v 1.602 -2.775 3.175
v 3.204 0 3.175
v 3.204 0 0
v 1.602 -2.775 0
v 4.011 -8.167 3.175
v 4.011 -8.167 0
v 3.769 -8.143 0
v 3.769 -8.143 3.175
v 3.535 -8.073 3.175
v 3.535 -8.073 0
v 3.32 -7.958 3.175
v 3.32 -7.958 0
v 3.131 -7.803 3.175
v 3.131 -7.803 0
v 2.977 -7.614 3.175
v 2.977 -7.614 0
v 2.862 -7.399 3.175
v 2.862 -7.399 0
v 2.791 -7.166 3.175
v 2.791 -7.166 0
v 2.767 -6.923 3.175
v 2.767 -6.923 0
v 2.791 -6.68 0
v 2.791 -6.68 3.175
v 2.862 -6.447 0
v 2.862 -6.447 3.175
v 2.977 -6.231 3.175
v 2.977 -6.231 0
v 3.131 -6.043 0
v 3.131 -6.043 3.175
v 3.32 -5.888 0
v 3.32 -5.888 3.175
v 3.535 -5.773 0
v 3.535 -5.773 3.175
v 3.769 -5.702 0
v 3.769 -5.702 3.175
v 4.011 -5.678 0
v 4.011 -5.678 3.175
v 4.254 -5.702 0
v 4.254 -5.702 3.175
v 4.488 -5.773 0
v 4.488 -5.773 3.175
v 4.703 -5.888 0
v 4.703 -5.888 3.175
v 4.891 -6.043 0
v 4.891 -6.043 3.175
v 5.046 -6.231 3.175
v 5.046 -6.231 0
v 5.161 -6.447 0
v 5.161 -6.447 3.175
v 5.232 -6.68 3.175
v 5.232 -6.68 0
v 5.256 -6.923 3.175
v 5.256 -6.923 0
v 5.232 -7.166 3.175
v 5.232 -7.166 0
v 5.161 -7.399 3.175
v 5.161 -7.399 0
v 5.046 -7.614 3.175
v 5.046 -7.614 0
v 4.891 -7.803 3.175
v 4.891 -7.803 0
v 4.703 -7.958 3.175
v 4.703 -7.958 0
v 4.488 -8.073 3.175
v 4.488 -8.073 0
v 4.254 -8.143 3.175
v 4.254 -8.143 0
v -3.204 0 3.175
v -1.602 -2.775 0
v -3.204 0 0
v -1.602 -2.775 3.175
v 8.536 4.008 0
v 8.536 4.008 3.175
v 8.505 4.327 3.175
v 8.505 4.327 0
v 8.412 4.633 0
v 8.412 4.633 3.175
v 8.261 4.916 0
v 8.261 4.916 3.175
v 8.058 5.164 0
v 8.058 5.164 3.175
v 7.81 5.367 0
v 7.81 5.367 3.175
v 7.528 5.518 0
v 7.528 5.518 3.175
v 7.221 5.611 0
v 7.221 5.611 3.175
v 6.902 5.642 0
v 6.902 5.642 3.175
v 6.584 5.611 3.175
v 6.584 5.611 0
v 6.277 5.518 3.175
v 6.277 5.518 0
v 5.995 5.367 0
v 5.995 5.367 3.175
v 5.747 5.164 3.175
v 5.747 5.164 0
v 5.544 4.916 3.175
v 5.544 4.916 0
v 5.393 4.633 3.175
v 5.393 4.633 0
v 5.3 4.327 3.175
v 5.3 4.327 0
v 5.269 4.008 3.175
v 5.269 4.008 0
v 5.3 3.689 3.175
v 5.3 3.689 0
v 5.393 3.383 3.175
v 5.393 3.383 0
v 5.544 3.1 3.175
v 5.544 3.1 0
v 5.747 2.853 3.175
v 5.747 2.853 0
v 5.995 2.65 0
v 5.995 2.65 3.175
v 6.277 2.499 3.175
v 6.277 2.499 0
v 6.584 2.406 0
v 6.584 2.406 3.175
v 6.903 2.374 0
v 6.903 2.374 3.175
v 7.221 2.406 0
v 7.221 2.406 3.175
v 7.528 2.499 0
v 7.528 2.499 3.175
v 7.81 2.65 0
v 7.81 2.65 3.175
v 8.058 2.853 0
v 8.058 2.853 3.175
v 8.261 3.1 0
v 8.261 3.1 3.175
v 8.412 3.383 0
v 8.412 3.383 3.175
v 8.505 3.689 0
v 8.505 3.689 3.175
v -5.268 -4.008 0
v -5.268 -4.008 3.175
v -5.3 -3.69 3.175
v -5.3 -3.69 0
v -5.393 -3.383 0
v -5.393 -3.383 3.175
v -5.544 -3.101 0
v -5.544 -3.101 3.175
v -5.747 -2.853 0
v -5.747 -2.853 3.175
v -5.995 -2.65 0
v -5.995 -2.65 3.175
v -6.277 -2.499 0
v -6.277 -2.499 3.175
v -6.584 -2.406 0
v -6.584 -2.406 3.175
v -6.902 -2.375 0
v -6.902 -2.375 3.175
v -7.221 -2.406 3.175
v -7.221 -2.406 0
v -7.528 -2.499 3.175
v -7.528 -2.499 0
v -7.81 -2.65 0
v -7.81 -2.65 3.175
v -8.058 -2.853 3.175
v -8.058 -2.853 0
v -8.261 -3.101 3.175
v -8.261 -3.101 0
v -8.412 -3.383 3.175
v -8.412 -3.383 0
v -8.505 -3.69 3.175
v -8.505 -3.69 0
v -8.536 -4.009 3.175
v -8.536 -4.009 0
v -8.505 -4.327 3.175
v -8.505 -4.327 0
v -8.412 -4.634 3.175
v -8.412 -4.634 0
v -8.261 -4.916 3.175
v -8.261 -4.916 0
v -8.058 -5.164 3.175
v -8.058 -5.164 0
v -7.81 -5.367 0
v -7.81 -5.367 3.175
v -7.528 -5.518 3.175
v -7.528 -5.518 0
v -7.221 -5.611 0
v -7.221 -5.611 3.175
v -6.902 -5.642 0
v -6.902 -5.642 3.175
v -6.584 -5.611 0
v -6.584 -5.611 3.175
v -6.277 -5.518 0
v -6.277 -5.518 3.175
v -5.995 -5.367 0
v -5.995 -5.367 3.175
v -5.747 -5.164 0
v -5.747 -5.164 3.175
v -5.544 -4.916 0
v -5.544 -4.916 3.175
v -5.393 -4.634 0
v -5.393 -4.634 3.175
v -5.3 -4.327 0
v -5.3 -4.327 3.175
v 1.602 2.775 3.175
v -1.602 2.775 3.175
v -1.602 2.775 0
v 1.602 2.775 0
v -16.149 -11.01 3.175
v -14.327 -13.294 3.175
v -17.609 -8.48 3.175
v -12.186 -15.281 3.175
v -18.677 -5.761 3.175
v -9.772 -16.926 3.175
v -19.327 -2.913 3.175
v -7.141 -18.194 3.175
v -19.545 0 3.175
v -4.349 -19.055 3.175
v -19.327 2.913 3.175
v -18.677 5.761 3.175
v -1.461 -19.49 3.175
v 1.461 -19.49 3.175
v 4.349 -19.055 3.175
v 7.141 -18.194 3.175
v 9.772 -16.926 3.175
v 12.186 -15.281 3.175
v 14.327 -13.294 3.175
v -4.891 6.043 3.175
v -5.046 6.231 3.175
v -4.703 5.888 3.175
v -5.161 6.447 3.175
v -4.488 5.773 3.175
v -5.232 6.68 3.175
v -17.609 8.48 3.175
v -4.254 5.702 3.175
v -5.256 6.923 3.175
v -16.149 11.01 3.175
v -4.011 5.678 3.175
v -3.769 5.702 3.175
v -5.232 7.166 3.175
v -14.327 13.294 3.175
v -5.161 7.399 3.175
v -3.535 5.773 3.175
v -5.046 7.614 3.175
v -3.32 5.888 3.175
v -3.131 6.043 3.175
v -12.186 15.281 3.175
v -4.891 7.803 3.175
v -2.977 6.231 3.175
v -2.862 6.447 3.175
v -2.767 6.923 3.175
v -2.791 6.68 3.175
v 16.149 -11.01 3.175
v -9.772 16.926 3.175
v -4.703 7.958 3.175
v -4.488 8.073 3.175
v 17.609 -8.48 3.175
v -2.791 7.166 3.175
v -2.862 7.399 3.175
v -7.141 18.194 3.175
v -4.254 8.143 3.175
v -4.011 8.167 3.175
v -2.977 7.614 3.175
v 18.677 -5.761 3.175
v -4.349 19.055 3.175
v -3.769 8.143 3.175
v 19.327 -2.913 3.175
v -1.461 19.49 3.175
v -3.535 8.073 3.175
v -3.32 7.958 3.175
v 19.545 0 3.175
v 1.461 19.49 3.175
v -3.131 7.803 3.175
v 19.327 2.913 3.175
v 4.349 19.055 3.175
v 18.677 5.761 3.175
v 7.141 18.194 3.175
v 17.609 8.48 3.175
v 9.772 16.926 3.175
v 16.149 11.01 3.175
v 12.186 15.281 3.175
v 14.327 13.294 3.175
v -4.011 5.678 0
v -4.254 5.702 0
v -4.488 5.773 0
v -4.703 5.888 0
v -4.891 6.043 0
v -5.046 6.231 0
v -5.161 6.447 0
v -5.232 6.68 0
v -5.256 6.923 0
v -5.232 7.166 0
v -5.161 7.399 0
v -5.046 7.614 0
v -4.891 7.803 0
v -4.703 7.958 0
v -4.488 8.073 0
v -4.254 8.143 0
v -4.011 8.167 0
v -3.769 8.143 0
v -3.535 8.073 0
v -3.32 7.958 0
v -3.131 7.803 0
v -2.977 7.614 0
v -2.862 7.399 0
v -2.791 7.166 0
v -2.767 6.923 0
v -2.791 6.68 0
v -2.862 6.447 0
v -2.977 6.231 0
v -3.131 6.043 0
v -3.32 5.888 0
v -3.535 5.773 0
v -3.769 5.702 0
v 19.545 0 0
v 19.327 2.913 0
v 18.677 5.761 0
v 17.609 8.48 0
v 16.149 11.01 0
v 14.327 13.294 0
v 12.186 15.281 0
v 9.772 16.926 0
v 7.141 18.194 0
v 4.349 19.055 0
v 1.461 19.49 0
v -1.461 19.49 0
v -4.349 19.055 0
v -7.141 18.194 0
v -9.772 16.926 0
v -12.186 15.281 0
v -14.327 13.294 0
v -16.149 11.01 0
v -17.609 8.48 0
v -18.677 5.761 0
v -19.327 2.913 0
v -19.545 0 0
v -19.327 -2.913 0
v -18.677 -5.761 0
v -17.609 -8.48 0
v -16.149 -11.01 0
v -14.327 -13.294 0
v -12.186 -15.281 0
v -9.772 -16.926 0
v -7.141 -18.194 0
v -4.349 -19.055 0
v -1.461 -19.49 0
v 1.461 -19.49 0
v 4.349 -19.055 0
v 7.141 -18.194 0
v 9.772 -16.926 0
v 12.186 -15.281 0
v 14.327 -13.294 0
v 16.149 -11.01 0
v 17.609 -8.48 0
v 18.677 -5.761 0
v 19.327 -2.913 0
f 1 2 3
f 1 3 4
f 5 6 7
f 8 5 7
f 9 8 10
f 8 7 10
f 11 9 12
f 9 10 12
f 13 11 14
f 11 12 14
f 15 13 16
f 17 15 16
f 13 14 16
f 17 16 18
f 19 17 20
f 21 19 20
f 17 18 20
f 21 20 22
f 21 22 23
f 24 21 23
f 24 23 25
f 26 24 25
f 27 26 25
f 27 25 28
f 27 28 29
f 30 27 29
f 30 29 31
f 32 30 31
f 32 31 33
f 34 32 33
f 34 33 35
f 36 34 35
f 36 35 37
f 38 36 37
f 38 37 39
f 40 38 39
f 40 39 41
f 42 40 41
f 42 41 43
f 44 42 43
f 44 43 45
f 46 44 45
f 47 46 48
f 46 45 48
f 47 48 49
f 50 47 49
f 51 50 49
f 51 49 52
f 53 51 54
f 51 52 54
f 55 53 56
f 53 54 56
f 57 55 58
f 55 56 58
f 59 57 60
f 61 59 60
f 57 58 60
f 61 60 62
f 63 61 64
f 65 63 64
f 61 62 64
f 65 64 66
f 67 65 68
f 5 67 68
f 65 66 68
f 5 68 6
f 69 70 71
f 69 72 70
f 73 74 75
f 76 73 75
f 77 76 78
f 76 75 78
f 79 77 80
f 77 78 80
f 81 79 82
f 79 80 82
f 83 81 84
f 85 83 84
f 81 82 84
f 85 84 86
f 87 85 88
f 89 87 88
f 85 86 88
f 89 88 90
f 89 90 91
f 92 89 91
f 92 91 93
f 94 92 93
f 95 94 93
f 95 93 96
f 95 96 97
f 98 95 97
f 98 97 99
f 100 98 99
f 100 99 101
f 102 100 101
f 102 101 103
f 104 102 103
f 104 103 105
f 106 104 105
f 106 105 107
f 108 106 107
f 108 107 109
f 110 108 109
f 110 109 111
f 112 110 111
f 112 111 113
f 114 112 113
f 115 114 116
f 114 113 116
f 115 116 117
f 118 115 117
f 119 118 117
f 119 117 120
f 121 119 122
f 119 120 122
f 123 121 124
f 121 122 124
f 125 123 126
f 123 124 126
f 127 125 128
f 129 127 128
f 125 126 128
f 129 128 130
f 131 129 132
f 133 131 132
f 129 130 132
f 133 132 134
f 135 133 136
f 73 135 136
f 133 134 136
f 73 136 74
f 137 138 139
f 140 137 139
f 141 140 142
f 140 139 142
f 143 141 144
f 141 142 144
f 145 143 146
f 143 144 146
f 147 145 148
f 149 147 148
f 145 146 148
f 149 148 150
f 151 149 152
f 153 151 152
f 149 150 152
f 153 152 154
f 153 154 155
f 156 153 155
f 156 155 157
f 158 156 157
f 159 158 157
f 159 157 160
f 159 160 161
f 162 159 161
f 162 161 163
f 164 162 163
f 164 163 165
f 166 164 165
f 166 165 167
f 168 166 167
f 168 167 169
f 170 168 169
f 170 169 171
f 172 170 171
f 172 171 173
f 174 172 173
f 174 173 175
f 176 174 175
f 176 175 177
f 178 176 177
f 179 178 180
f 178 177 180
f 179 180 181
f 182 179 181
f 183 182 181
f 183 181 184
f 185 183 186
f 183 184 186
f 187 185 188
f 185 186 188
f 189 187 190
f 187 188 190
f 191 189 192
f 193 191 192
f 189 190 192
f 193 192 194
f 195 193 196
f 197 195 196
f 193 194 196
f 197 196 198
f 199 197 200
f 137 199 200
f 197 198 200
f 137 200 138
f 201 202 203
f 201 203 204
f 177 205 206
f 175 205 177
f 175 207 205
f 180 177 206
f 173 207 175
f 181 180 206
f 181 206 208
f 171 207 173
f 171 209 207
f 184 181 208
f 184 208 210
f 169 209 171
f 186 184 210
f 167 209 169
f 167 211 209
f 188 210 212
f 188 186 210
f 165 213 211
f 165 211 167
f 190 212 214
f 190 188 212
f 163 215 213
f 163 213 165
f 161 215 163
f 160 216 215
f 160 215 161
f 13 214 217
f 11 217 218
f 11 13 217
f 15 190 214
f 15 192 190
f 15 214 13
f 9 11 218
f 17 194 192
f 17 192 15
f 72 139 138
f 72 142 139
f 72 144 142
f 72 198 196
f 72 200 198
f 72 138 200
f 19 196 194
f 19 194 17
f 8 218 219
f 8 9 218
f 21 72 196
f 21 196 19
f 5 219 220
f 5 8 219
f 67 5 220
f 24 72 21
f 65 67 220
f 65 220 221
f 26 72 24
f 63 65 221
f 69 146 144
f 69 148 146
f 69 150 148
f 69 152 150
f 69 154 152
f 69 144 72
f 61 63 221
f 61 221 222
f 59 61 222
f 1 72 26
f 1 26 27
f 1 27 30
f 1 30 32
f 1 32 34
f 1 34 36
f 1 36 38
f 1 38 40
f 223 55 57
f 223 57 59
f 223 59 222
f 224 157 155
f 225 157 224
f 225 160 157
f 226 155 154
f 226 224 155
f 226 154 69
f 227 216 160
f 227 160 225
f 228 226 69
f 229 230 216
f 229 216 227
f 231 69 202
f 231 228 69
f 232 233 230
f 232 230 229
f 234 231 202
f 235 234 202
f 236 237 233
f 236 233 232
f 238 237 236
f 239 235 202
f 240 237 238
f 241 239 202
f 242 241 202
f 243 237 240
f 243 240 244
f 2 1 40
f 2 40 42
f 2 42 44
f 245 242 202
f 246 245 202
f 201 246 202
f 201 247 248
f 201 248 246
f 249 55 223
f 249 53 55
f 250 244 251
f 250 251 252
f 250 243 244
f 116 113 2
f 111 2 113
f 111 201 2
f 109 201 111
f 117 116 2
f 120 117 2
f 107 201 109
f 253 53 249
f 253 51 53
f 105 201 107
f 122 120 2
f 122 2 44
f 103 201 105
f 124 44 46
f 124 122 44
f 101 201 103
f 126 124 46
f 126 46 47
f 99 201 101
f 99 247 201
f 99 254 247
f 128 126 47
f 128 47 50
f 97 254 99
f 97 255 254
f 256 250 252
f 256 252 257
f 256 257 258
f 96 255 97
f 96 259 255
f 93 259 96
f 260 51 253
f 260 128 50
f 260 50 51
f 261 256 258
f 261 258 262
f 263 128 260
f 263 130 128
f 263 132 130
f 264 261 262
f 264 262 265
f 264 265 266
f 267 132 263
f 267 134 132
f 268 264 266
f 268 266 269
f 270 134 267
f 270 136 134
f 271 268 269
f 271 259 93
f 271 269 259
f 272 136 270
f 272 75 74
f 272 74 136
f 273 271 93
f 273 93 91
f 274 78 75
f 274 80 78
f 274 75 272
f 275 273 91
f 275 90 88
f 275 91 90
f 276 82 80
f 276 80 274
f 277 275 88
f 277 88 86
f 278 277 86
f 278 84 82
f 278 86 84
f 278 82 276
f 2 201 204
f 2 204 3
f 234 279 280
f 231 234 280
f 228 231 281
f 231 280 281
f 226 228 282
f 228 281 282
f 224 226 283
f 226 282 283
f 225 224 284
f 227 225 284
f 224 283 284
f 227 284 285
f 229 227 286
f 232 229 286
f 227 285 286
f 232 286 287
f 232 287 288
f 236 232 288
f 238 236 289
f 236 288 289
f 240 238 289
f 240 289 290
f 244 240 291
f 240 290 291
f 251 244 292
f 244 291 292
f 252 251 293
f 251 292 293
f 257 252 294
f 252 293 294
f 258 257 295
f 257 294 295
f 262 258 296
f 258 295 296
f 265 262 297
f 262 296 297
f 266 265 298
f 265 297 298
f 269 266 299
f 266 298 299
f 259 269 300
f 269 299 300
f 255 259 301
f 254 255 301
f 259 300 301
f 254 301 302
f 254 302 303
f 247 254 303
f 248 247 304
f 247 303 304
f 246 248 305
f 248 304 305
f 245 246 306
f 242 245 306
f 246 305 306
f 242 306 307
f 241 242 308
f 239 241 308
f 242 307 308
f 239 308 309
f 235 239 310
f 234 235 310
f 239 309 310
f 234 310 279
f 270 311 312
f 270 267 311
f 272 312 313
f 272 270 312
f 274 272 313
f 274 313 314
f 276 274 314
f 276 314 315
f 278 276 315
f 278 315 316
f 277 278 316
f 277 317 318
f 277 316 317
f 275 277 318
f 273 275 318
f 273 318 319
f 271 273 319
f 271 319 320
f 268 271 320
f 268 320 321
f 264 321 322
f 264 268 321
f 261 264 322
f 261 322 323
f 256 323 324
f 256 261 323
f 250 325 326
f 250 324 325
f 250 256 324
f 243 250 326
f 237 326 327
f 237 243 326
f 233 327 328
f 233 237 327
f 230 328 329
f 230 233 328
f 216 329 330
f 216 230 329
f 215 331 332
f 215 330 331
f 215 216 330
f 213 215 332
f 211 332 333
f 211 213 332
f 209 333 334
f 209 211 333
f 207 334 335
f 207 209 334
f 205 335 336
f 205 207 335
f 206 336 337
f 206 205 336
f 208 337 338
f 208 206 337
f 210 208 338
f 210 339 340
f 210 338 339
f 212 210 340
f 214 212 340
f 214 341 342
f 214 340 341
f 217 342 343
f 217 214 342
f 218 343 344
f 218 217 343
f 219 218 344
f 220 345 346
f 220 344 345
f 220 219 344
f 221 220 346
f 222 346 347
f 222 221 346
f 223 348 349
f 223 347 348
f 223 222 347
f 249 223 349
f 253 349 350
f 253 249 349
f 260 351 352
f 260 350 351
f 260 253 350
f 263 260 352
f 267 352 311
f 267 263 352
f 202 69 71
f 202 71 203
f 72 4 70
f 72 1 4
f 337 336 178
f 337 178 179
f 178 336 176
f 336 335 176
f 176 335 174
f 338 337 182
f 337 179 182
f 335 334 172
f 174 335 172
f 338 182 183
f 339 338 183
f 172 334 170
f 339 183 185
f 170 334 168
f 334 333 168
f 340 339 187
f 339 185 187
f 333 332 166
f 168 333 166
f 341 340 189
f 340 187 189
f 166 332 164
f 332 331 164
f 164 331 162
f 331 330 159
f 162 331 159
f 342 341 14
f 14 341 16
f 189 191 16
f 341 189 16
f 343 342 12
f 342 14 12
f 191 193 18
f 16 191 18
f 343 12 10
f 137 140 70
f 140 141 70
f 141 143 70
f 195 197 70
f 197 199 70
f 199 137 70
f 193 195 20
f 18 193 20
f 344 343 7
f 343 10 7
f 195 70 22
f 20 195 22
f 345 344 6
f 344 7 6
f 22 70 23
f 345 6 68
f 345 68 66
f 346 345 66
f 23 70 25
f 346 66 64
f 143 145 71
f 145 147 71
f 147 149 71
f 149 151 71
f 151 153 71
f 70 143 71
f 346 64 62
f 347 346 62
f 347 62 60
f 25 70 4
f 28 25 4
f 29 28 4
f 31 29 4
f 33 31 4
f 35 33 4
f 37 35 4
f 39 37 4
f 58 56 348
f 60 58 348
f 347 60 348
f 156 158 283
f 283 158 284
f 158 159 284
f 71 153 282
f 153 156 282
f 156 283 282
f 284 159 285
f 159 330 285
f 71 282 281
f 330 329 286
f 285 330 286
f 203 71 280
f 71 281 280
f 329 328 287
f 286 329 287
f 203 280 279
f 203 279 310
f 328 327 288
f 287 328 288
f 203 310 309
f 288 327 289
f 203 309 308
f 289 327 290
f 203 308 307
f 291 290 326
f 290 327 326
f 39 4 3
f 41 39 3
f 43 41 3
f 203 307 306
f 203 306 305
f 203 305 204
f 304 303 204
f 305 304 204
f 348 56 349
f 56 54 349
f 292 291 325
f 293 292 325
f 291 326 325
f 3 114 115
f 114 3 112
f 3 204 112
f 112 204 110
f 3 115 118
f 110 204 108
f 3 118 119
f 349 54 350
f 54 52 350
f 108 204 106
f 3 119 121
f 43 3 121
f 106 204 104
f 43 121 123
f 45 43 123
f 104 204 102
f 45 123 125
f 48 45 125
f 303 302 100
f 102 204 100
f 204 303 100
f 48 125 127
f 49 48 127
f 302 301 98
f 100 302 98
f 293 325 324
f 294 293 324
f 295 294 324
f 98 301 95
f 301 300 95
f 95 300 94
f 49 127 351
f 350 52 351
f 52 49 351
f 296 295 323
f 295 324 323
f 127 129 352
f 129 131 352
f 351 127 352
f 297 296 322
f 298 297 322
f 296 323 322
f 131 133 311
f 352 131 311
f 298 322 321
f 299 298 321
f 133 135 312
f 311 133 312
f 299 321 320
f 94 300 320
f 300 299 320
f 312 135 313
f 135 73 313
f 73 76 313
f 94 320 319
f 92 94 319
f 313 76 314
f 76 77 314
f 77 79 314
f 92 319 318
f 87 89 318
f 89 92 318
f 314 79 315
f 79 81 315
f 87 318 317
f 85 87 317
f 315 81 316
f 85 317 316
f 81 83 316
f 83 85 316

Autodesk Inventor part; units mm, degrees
ref_plane "YZ Plane" through (0, 0, 0) normal (1, 0, 0) x (0, 1, 0)
ref_plane "XZ Plane" through (0, 0, 0) normal (0, 1, 0) x (-1, 0, 0)
ref_plane "XY Plane" through (0, 0, 0) normal (0, 0, 1) x (1, 0, 0)
sketch "Sketch1" plane through (0, 0, 0) normal (0, 0, 1) x (1, 0, 0)
  circle A0 centre (0, 0) radius 27.6352
  dimension "d0" = 55.2704
extrude "Extrusion1" add sketch "Sketch1" along normal blind 3.175
sketch "Sketch2" plane through (0, 0, 3.175) normal (0, 0, 1) x (1, 0, 0)
  circle A0 centre (0, 0) radius 27.6352 projected
  line L0 (0, 27.6352) -> (0, 0)
  line L1 (0, 0) -> (23.9328, -13.8176)
  line L2 (0, 0) -> (-23.9328, -13.8176)
  line L3 (0, 0) -> (27.6352, 0) construction
  line L4 (0, 27.6352) -> (0, 19.4152)
  line L5 (0, 19.4152) -> (5.08, 19.4152)
  line L6 (0, 19.4152) -> (-5.08, 19.4152)
  arc A1 (5.08, 19.4152) -> (-5.08, 19.4152) centre (0, -5.5937) ccw
  line L7 (-5.08, 19.4152) -> (2.5298, 19.4152) construction
  line L8 (-5.08, 19.4152) -> (-7.5281, 26.5901)
  line L9 (-5.08, 19.4152) -> (2.501, 19.4152) construction
  line L10 (5.08, 19.4152) -> (7.5281, 26.5901)
  line L11 (5.08, 19.4152) -> (12.661, 19.4152) construction
  line L12 (23.9328, -13.8176) -> (16.8277, -9.7155)
  line L13 (16.8277, -9.7155) -> (19.355, -5.3381)
  line L14 (16.8277, -9.7155) -> (14.3004, -14.0929)
  line L15 (16.8277, -9.7155) -> (17.2897, -9.9822)
  arc A2 (14.3004, -14.0929) -> (19.355, -5.3381) centre (-3.6819, 2.1257) ccw
  point P0 (0.3732, 19.9232)
  point P1 (0, 19.9259)
  dimension "d3" = 120
  dimension "d5" = 120
  dimension "d6" = 120
  dimension "d7" = 8.22
  dimension "d8" = 5.08
  dimension "d9" = 5.08
  dimension "d11" = 108.84
  dimension "d12" = 71.16
  dimension "d13" = 8.2042
  dimension "d14" = 5.0546
  dimension "d15" = 5.0546
  dimension "d16" = 6.16
  dimension "d17" = 0.5334
  dimension "d51" = 0.508
extrude "Extrusion2" cut sketch "Sketch2" against normal blind 3.175 contours L10 A1 L0 A0 | L0 A1 L8 A0
pattern_circular "Circular Pattern1" count 3 over 360 about axis through (0, 0, 0) along (0, 0, 1) of "Extrusion2"
sketch "Sketch4" plane through (0, 0, 3.175) normal (0, 0, 1) x (1, 0, 0)
  line L0 (-1.6129, -2.7686) -> (1.6129, -2.7686)
  line L1 (0, 2.7686) -> (0, 0)
  line L2 (0, -2.7686) -> (0, 0)
  line L3 (-1.6021, 2.7749) -> (1.6021, 2.7749)
  line L4 (1.6021, 2.7749) -> (3.2042, 0)
  line L5 (3.2042, 0) -> (1.6021, -2.7749)
  line L6 (1.6021, -2.7749) -> (-1.6021, -2.7749)
  line L7 (-1.6021, -2.7749) -> (-3.2042, 0)
  line L8 (-3.2042, 0) -> (-1.6021, 2.7749)
  line L9 (0, 0) -> (6.3283, 0)
extrude "Extrusion3" cut sketch "Sketch4" against normal blind 25.4
sketch "Sketch5" plane through (0, 0, 3.175) normal (0, 0, 1) x (1, 0, 0)
  line L0 (0, 0) -> (-11.9711, 20.5846)
  line L1 (-5.08, 19.4152) -> (-7.5281, 26.5901) projected
  circle A0 centre (-11.9711, 20.5846) radius 2.159
  line L2 (0, 0) -> (11.8412, 20.6596)
  line L3 (7.5281, 26.5901) -> (5.08, 19.4152) projected
  circle A1 centre (11.8412, 20.6596) radius 2.159
  line L4 (0, 0) -> (23.8124, 0.075)
  line L5 (19.3541, -5.3082) -> (26.7917, -6.7755) projected
  circle A2 centre (23.8124, 0.075) radius 2.159
  line L6 (0, 0) -> (11.9959, -20.5702)
  line L7 (19.2636, -19.8146) -> (14.2741, -14.107) projected
  circle A3 centre (11.9959, -20.5702) radius 2.159
  line L8 (0, 0) -> (-11.8291, -20.6666)
  line L9 (-14.2741, -14.107) -> (-19.2636, -19.8146) projected
  circle A4 centre (-11.8291, -20.6666) radius 2.159
  line L10 (-19.3541, -5.3082) -> (-26.7917, -6.7755) projected
  line L11 (0, 0) -> (-23.7488, -0.1036)
  line L12 (0, 0) -> (23.749, 0) construction
  dimension "d52" = 23.8125
  dimension "d54" = 4.318
  dimension "d55" = 23.8125
  dimension "d57" = 4.318
  dimension "d58" = 23.8125
  dimension "d60" = 4.318
  dimension "d61" = 23.8125
  dimension "d63" = 4.318
  dimension "d64" = 23.8125
  dimension "d66" = 4.318
  dimension "d69" = 23.8125
  dimension "d70" = 23.8252
  dimension "d82" = 5.969
  dimension "d86" = 59.931
  dimension "d88" = 23.749
  dimension "d89" = 180.25
extrude "Extrusion4" cut sketch "Sketch5" against normal blind 25.4
hole "Hole2" at (-23.7488, -0.1036, 3.175) direction (0, 0, -1) diameter 4.318 depth 25.4 tip angle 118
sketch "Sketch7" plane through (0, 0, 3.175) normal (0, 0, 1) x (1, 0, 0)
  line L0 (1.6021, 2.7749) -> (3.2042, 0) projected
  line L1 (2.4031, 1.3874) -> (6.9025, 4.0082)
  line L2 (2.4031, 1.3874) -> (7.6101, 1.3874) construction
  circle A0 centre (6.9025, 4.0082) radius 1.6339
  point P0 (0, 0)
  dimension "d105" = 5.207
  dimension "d106" = 30.22
  dimension "d107" = 3.2677
extrude "Extrusion5" cut sketch "Sketch7" against normal blind 25.4
sketch "Sketch8" plane through (0, 0, 3.175) normal (0, 0, 1) x (1, 0, 0)
  line L0 (-3.2042, 0) -> (-1.6021, -2.7749) projected
  line L1 (-2.4031, -1.3874) -> (-6.9023, -4.0085)
  circle A0 centre (-6.9023, -4.0085) radius 1.6339
  point P0 (0, 0)
  dimension "d112" = 5.207
  dimension "d113" = 3.2677
extrude "Extrusion6" cut sketch "Sketch8" against normal blind 25.4
thicken "Thicken1" operation add thickness 0.635 both sides no extend neighbours yes toward (-0.946424, -0.3229265, 0) faces at (-6.7121, 24.1984, 1.0583)
thicken "Thicken2" operation add thickness 0.635 both sides no extend neighbours yes toward (0.946424, -0.3229265, 0) faces at (5.896, 21.8068, 2.1167)
thicken "Thicken3" operation add thickness 0.635 both sides no extend neighbours yes toward (0.1935495, 0.9810905, 0) faces at (24.3125, -6.2864, 2.1167)
thicken "Thicken4" operation add thickness 0.635 both sides no extend neighbours yes toward (-0.7528746, -0.658164, 0) faces at (17.6004, -17.9121, 1.0583)
thicken "Thicken5" operation add thickness 0.635 both sides no extend neighbours yes toward (-0.1935495, 0.9810905, 0) faces at (-24.3125, -6.2864, 1.0583)
thicken "Thicken6" operation add thickness 0.635 both sides no extend neighbours yes toward (0.7528746, -0.658164, 0) faces at (-17.6004, -17.9121, 2.1167)
thicken "Thicken7" operation add thickness 0.381 both sides no extend neighbours yes toward (0.1744546, -0.9846652, 0) faces at (-4.452, 19.5346, 2.1167)
thicken "Thicken8" operation add thickness 0.381 both sides no extend neighbours yes toward (-0.9217033, 0.3878957, 0) faces at (18.6772, -7.1021, 1.0583)
thicken "Thicken9" operation add thickness 0.381 both sides no extend neighbours yes toward (0.7655178, 0.6434147, 0) faces at (-14.6914, -13.6229, 2.1167)
sketch "Sketch14" plane through (0, 0, 3.175) normal (0, 0, 1) x (1, 0, 0)
  line L0 (0, 0) -> (-4.0114, 6.9228)
  line L1 (0, 0) -> (8.001, 0) construction
  line L2 (0, 0) -> (4.0114, -6.9228)
  line L3 (0, 0) -> (8.001, 0) construction
  dimension "d170" = 8.001
  dimension "d171" = 120.09
  dimension "d172" = 8.001
  dimension "d173" = 59.91
hole "Hole5" at (-4.0114, 6.9228, 3.175) at (4.0114, -6.9228, 3.175) direction (0, 0, -1) diameter 2.4892 depth 9.525 tip angle 118
sketch "Sketch15" plane through (0, 0, 3.175) normal (0, 0, 1) x (1, 0, 0)
  circle A0 centre (0, 0) radius 19.5449
sketch "Sketch16" plane through (0, 0, 3.175) normal (0, 0, 1) x (1, 0, 0)
  circle A0 centre (0, 0) radius 27.6352
  circle A1 centre (0, 0) radius 19.5449 projected
  arc A2 (-8.1376, 26.4099) -> (-26.9405, -6.1576) centre (0, 0) ccw projected
  arc A3 (26.9405, -6.1576) -> (8.1376, 26.4099) centre (0, 0) ccw projected
  arc A4 (-18.8029, -20.2523) -> (18.8029, -20.2523) centre (0, 0) ccw projected
  arc A5 (13.5925, -14.2922) -> (19.1737, -4.6254) centre (-4.8443, 2.7969) ccw projected
  arc A6 (-19.1737, -4.6254) -> (-13.5925, -14.2922) centre (4.8443, 2.7969) ccw projected
  arc A7 (5.5811, 18.9176) -> (-5.5811, 18.9176) centre (0, -5.5937) ccw projected
extrude "Extrusion9" cut sketch "Sketch16" against normal blind 25.4
equation "\"d55\" = d52"
equation "\"d58\" = d52"
equation "\"d61\" = d52"
equation "\"d64\" = d52"
equation "\"d69\" = d52"
properties part number "NewMechanumWheelHub"
